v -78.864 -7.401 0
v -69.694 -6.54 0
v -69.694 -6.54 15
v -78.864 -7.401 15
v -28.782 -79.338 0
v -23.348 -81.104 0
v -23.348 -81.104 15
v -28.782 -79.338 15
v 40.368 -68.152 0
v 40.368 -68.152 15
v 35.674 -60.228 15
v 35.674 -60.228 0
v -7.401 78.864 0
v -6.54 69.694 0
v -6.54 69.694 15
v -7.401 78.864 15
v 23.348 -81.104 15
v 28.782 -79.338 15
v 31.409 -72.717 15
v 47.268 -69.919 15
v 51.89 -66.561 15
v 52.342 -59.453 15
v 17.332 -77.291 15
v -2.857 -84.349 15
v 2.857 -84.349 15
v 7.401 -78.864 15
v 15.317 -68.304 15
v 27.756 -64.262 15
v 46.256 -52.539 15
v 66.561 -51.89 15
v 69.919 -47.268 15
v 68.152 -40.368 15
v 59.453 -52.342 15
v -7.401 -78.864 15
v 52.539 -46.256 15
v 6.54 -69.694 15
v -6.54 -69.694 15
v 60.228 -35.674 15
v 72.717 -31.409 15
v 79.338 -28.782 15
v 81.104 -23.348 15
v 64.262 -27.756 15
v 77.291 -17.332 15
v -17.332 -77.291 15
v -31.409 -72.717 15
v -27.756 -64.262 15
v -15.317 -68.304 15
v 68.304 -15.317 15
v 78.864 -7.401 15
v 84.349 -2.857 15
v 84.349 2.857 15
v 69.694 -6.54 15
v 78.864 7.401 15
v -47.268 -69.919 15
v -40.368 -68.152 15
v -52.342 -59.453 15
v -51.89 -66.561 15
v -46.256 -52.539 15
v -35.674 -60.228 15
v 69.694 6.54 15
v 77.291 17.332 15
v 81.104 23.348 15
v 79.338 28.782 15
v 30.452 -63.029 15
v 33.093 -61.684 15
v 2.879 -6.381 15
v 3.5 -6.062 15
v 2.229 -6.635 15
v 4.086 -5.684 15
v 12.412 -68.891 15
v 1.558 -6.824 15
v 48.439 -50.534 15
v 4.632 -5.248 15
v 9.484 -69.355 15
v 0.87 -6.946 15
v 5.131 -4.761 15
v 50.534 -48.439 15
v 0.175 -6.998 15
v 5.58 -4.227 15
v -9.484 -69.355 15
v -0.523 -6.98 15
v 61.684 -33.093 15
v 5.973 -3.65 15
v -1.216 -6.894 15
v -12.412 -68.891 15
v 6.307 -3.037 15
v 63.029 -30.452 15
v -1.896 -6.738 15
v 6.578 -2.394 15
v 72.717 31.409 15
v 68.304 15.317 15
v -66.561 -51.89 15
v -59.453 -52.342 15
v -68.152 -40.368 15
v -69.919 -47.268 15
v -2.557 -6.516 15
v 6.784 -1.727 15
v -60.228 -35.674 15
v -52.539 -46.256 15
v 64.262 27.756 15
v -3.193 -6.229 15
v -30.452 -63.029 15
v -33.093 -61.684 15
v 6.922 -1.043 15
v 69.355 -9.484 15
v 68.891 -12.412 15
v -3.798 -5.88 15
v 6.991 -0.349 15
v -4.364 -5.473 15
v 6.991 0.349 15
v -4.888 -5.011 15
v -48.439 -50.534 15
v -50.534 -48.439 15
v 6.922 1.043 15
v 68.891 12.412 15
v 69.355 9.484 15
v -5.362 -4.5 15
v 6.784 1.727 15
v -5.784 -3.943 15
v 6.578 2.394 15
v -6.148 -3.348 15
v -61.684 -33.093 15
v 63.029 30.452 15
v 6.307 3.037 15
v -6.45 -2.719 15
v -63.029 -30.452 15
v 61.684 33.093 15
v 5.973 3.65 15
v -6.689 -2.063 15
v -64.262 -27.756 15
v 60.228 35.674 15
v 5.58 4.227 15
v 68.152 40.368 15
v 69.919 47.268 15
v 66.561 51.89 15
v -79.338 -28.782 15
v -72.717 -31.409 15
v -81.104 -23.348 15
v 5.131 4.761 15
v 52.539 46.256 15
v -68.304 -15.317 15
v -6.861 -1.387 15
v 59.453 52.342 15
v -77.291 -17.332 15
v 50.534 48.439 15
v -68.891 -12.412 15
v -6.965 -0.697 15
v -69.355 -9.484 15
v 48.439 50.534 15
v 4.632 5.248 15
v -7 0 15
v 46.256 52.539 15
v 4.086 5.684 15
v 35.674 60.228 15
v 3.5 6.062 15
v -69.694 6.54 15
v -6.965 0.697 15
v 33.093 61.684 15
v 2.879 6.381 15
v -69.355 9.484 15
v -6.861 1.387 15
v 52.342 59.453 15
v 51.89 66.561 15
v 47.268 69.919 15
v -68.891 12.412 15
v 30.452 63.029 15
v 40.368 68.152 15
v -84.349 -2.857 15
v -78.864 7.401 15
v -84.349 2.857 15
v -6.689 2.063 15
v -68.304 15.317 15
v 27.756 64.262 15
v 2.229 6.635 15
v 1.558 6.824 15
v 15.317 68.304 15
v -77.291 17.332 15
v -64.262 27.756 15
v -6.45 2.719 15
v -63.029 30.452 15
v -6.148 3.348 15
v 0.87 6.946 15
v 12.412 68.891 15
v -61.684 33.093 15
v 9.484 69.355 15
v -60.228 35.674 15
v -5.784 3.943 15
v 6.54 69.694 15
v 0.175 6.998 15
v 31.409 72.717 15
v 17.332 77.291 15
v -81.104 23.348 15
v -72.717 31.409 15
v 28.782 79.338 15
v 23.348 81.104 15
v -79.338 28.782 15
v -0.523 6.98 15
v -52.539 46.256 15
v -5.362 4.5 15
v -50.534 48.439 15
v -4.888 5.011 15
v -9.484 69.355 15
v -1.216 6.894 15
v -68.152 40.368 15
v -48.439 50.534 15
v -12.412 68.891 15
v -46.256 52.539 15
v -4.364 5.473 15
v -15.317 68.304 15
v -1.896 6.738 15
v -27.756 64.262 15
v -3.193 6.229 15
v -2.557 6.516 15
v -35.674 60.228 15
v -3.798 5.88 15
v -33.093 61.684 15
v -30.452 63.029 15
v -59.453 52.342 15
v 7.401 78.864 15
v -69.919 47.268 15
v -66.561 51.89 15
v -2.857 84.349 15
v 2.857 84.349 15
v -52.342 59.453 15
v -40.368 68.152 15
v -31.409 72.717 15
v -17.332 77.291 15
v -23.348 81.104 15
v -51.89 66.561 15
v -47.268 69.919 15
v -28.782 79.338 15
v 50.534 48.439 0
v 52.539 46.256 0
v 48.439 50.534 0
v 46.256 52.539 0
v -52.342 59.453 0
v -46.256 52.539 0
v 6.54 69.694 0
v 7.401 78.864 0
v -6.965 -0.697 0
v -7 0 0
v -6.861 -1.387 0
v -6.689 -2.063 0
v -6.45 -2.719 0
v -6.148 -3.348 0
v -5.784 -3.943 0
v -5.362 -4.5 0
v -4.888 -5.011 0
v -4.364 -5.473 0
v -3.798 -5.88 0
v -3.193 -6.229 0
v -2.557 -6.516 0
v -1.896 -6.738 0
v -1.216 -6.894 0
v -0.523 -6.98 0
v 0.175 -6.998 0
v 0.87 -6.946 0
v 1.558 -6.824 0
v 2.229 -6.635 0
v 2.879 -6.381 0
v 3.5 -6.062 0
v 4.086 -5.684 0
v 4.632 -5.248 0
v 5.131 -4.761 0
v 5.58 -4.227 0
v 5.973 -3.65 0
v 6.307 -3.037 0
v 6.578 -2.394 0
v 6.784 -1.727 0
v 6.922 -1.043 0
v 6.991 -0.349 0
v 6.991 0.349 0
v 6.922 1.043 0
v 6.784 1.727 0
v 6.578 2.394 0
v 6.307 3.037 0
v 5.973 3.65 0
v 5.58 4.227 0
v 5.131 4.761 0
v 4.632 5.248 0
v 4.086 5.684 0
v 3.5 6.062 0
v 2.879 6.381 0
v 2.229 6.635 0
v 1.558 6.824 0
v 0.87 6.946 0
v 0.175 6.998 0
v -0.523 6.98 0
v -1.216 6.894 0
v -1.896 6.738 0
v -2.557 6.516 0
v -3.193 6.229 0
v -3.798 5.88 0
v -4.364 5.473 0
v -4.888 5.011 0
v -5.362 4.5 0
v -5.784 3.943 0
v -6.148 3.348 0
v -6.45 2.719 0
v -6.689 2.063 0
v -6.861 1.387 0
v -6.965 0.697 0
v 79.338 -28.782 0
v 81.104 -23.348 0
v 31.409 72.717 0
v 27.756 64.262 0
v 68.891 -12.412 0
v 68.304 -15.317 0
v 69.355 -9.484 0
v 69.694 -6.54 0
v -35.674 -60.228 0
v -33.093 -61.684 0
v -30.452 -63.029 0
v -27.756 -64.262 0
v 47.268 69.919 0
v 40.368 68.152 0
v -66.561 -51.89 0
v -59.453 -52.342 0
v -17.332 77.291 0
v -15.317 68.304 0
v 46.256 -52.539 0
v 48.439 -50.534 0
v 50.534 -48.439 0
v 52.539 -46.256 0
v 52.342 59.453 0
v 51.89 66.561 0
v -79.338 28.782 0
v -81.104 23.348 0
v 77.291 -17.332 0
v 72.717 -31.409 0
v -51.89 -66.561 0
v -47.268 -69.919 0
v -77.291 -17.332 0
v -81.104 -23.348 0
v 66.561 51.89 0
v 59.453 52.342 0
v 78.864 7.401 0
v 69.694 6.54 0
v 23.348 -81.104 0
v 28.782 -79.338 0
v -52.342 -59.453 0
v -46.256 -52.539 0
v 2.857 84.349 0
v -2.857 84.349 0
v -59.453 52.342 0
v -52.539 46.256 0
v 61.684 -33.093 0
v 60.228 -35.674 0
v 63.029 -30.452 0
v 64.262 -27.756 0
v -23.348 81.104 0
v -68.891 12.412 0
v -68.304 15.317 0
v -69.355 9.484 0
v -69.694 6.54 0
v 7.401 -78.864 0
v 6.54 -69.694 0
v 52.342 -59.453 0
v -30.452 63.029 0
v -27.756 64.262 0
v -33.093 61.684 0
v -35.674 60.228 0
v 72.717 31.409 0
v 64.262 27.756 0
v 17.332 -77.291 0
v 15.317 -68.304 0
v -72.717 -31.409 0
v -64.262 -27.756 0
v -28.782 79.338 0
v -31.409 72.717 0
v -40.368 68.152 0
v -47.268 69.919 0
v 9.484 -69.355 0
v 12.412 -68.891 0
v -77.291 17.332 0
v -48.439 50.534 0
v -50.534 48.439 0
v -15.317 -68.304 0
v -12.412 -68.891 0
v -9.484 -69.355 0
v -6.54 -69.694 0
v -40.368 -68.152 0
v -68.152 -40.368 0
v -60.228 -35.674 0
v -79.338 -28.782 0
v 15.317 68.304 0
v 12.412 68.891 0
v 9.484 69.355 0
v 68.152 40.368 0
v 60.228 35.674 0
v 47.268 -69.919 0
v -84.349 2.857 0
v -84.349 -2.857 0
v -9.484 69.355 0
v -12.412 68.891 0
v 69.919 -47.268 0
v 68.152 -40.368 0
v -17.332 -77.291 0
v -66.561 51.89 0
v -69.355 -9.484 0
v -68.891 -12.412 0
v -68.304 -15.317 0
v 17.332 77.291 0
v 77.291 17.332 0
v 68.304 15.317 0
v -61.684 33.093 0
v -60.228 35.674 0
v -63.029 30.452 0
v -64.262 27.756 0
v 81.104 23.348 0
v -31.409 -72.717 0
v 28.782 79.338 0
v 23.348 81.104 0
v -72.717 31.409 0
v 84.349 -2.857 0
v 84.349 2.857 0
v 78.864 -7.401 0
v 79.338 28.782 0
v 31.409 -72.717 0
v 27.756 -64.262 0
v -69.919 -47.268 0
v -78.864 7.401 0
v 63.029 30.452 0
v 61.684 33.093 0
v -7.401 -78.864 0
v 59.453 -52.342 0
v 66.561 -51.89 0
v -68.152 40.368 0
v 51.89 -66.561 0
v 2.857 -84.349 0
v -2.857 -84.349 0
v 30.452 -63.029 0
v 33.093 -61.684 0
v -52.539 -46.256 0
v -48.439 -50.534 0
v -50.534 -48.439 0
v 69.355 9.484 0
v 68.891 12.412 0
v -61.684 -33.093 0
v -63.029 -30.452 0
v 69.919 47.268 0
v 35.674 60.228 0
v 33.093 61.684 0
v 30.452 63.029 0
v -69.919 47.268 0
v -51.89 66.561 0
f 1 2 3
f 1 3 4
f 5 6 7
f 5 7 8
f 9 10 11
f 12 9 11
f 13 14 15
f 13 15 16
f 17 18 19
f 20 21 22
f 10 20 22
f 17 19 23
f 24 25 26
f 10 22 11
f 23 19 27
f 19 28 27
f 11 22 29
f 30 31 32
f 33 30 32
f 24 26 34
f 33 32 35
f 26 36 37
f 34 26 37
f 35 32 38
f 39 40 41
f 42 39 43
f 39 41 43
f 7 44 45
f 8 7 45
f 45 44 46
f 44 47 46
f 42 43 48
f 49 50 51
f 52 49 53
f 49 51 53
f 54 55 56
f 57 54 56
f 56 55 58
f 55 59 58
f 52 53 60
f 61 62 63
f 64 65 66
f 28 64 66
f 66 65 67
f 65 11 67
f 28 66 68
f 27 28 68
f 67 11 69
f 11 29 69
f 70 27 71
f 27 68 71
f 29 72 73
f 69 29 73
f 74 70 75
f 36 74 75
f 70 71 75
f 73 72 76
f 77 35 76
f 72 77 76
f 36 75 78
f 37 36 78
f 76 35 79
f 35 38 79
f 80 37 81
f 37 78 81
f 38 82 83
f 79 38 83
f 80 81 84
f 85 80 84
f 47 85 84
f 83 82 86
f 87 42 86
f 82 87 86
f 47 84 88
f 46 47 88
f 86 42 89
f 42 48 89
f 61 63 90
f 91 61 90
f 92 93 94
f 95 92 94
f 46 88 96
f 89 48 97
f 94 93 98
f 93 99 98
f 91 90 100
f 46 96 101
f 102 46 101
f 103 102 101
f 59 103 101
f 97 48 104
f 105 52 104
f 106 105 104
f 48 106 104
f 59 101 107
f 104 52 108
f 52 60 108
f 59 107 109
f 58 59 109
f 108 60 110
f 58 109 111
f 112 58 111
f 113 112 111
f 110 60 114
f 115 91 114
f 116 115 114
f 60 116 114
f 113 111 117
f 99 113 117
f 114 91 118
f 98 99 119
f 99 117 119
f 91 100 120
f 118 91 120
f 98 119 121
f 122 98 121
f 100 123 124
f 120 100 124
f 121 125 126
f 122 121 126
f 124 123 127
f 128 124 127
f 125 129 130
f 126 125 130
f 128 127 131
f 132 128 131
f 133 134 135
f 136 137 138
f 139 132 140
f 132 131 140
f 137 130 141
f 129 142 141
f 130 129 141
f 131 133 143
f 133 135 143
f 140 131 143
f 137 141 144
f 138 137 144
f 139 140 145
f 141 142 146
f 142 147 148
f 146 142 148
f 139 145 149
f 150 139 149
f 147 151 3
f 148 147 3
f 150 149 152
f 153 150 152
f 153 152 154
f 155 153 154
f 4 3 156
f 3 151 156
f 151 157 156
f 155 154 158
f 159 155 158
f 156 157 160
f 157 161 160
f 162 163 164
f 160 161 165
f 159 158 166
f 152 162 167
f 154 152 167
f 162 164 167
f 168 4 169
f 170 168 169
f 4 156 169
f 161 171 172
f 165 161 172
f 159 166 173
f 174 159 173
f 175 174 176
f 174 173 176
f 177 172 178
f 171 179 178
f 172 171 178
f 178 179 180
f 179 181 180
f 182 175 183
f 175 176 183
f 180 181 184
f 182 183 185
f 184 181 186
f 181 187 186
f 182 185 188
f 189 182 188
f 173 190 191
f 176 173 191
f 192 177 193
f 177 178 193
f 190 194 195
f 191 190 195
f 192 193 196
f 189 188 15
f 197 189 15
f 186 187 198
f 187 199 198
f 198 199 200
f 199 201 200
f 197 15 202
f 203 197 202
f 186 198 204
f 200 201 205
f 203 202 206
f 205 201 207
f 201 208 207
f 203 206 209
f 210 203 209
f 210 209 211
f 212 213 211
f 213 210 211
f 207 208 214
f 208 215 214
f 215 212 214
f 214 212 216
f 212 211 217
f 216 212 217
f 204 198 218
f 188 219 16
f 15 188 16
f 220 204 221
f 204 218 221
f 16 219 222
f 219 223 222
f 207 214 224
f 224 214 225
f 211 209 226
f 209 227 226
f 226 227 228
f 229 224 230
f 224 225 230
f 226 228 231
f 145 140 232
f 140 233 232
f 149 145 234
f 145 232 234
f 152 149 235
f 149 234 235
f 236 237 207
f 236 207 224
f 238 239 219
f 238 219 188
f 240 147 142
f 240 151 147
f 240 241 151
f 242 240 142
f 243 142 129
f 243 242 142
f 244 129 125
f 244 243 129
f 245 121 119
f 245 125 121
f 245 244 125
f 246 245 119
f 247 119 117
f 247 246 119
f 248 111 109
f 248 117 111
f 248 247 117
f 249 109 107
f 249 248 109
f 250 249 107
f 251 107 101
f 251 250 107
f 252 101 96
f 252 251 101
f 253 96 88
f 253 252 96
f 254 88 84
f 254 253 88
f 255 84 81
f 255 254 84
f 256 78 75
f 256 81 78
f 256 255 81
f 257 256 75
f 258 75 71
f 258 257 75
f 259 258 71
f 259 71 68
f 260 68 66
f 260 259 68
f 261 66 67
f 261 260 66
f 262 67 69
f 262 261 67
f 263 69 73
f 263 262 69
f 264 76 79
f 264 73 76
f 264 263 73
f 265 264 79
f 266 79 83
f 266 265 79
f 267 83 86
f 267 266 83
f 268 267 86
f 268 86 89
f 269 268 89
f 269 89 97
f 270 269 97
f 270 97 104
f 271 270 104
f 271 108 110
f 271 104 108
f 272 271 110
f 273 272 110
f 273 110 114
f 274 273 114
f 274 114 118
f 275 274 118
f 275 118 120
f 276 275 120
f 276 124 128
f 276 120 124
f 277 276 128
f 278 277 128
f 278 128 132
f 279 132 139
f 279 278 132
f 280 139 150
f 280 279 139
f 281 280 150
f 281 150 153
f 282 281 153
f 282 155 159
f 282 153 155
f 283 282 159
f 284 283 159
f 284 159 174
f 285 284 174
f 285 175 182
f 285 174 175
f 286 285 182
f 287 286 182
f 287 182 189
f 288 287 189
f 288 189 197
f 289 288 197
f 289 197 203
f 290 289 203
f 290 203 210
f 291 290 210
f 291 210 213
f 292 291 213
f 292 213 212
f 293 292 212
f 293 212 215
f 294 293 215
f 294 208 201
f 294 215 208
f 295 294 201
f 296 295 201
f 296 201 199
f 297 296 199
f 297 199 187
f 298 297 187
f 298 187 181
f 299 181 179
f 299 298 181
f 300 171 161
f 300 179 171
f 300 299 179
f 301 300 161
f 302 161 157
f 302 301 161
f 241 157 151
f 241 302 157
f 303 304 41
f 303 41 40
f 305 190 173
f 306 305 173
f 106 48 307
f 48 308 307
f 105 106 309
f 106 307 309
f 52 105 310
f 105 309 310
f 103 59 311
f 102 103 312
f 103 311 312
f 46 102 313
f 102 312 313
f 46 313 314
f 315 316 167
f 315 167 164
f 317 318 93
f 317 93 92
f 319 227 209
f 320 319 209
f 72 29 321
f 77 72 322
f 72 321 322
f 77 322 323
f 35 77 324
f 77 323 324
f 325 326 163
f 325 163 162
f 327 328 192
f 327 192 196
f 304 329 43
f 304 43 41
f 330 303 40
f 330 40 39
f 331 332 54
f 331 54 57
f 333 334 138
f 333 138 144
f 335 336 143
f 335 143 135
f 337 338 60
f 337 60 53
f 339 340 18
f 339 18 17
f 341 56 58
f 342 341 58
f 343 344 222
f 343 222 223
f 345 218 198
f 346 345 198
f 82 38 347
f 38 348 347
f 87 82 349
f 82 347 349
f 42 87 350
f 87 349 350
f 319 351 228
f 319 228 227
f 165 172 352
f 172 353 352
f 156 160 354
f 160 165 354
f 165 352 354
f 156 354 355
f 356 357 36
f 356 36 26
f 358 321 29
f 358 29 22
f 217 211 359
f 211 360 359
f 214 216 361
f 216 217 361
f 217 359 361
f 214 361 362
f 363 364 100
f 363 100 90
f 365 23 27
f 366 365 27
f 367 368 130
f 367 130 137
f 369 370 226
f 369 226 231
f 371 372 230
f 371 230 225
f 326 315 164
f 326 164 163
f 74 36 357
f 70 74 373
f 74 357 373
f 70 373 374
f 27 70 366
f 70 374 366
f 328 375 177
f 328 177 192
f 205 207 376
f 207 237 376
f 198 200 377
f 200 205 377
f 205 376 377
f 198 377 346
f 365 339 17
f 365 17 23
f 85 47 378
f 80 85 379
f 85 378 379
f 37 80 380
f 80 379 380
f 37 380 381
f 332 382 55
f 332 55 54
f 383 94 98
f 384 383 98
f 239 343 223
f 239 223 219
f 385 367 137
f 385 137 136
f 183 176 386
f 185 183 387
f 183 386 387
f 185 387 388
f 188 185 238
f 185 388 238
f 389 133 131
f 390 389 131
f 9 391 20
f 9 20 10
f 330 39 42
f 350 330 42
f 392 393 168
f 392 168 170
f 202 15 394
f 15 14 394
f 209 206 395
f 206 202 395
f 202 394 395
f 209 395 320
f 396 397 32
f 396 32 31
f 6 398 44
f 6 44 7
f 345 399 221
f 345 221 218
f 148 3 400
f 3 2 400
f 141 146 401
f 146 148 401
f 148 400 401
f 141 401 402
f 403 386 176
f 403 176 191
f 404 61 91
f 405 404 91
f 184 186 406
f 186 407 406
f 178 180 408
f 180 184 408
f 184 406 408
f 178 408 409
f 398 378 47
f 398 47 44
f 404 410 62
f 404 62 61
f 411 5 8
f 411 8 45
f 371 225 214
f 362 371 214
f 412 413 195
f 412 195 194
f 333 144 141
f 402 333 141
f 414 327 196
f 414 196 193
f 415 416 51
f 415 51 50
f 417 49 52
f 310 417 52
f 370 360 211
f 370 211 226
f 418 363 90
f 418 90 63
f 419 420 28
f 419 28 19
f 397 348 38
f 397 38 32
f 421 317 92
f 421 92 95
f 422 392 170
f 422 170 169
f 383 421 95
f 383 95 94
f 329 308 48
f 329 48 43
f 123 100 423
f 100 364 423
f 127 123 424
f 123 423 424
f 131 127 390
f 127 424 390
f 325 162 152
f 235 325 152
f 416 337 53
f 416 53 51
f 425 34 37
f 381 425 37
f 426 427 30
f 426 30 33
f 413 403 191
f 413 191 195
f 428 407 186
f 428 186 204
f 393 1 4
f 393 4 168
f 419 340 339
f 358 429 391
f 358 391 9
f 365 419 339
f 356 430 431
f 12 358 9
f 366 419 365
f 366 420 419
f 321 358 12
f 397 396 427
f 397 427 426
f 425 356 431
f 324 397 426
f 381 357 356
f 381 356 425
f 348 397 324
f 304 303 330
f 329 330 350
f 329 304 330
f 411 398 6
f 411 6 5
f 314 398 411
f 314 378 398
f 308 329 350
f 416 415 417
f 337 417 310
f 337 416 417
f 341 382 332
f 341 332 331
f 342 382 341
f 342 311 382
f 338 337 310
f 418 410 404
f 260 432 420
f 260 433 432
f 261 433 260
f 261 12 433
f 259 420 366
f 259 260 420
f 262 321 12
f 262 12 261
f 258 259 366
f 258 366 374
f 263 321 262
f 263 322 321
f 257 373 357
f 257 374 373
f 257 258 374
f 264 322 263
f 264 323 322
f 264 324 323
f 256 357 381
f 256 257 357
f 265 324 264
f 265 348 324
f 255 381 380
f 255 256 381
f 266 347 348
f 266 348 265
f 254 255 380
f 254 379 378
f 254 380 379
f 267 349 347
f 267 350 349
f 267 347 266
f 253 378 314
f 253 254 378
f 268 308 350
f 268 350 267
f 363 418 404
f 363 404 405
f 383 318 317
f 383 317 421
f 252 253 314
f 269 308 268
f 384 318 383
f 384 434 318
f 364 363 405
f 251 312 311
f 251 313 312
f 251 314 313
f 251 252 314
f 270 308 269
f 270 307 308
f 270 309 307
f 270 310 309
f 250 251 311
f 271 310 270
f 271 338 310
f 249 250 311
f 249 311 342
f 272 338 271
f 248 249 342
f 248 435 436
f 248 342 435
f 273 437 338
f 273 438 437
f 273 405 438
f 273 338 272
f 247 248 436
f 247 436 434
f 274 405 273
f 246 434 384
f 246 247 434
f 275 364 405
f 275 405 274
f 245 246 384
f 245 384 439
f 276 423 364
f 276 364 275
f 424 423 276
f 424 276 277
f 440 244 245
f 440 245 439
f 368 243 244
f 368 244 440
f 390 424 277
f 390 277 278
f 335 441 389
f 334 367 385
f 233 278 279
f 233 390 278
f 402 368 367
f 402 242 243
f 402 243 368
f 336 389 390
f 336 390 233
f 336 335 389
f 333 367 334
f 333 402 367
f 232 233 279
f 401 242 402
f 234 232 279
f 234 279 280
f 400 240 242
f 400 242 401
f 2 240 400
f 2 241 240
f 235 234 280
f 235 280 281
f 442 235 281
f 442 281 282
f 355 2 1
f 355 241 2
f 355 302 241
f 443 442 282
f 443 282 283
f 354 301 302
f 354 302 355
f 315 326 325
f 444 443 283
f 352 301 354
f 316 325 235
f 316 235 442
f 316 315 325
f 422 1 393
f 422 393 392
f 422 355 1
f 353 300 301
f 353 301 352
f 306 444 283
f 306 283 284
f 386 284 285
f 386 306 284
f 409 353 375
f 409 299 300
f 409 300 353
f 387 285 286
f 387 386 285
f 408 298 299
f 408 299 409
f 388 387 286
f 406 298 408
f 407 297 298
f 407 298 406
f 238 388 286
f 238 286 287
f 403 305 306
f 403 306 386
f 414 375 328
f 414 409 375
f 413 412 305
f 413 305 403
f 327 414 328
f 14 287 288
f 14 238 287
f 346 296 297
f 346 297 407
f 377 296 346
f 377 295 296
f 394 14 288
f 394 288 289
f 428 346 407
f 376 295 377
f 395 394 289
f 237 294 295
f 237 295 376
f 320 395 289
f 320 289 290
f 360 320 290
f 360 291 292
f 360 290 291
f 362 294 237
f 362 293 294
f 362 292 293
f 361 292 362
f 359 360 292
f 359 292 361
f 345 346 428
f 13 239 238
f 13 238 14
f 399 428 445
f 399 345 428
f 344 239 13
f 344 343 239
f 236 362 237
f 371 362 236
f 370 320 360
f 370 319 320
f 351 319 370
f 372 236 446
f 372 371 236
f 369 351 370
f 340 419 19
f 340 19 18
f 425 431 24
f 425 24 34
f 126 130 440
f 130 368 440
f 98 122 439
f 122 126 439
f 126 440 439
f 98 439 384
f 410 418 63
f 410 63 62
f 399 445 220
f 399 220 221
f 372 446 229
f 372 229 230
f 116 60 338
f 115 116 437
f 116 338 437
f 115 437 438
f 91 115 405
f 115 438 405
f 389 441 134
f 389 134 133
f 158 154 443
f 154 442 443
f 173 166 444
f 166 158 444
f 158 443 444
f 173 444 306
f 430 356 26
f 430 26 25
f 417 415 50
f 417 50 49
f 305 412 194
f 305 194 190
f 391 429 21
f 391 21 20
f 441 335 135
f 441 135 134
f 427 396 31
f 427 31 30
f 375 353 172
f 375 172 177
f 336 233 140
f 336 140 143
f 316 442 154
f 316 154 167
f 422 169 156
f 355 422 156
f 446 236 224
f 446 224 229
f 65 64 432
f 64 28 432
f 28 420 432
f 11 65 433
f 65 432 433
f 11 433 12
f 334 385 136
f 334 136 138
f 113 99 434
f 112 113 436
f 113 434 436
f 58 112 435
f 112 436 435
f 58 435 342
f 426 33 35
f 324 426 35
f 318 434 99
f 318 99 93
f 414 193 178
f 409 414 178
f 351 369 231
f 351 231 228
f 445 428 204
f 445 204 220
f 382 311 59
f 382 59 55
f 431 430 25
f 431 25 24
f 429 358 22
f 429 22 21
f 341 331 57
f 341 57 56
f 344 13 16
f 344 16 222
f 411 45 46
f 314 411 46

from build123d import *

# Parameters (mm, degrees)
SKETCH1_R               = 70
BOSS_EXTRUDE1_DEPTH     = 15
CUT_EXTRUDE5_DEPTH      = 55
CUT_EXTRUDE5_DEPTH_BACK = 101.124921973
SKETCH2_R               = 7
BOSS_EXTRUDE2_DEPTH     = 15
CIRPATTERN2_COUNT       = 20


with BuildPart() as part:
    # Sketch1 → Boss-Extrude1 (new body)
    with BuildSketch(Plane.XY):
        with Locations(Location((0, 0, 0), (0, 0, 180))):
            Circle(SKETCH1_R)
    extrude(amount=BOSS_EXTRUDE1_DEPTH)

    # Sketch2 → Cut-Extrude5 (cut, two sides: drawn at the far end of the back side and taken through both)
    with BuildSketch(Plane.XY.offset(-CUT_EXTRUDE5_DEPTH_BACK)):
        with Locations(Location((0, 0, 0), (0, 0, 180))):
            Circle(SKETCH2_R)
    extrude(amount=CUT_EXTRUDE5_DEPTH + CUT_EXTRUDE5_DEPTH_BACK, mode=Mode.SUBTRACT)

    # Sketch5 → Boss-Extrude2 (add)
    with BuildSketch(Plane.XY):
        Polygon((-6.539966856, 69.693822061), (-7.40050252, 78.864207898), (-2.856692059, 84.349096927), (2.856692059, 84.349096927), (7.40050252, 78.864207898), (6.539966856, 69.693822061), (6.538233044, 69.675345525), (-1.985773494, 69.971827928), (-6.526217216, 69.574369749), align=None)
    boss_extrude2 = extrude(amount=BOSS_EXTRUDE2_DEPTH)

    # CirPattern2: Boss-Extrude2 ×20 about axis
    cirpattern2_axis = Axis((0, 0, 0), (0, 0, 1))
    for i in range(1, CIRPATTERN2_COUNT):
        add(boss_extrude2.rotate(cirpattern2_axis, i * 360 / CIRPATTERN2_COUNT))


solid = part.part
